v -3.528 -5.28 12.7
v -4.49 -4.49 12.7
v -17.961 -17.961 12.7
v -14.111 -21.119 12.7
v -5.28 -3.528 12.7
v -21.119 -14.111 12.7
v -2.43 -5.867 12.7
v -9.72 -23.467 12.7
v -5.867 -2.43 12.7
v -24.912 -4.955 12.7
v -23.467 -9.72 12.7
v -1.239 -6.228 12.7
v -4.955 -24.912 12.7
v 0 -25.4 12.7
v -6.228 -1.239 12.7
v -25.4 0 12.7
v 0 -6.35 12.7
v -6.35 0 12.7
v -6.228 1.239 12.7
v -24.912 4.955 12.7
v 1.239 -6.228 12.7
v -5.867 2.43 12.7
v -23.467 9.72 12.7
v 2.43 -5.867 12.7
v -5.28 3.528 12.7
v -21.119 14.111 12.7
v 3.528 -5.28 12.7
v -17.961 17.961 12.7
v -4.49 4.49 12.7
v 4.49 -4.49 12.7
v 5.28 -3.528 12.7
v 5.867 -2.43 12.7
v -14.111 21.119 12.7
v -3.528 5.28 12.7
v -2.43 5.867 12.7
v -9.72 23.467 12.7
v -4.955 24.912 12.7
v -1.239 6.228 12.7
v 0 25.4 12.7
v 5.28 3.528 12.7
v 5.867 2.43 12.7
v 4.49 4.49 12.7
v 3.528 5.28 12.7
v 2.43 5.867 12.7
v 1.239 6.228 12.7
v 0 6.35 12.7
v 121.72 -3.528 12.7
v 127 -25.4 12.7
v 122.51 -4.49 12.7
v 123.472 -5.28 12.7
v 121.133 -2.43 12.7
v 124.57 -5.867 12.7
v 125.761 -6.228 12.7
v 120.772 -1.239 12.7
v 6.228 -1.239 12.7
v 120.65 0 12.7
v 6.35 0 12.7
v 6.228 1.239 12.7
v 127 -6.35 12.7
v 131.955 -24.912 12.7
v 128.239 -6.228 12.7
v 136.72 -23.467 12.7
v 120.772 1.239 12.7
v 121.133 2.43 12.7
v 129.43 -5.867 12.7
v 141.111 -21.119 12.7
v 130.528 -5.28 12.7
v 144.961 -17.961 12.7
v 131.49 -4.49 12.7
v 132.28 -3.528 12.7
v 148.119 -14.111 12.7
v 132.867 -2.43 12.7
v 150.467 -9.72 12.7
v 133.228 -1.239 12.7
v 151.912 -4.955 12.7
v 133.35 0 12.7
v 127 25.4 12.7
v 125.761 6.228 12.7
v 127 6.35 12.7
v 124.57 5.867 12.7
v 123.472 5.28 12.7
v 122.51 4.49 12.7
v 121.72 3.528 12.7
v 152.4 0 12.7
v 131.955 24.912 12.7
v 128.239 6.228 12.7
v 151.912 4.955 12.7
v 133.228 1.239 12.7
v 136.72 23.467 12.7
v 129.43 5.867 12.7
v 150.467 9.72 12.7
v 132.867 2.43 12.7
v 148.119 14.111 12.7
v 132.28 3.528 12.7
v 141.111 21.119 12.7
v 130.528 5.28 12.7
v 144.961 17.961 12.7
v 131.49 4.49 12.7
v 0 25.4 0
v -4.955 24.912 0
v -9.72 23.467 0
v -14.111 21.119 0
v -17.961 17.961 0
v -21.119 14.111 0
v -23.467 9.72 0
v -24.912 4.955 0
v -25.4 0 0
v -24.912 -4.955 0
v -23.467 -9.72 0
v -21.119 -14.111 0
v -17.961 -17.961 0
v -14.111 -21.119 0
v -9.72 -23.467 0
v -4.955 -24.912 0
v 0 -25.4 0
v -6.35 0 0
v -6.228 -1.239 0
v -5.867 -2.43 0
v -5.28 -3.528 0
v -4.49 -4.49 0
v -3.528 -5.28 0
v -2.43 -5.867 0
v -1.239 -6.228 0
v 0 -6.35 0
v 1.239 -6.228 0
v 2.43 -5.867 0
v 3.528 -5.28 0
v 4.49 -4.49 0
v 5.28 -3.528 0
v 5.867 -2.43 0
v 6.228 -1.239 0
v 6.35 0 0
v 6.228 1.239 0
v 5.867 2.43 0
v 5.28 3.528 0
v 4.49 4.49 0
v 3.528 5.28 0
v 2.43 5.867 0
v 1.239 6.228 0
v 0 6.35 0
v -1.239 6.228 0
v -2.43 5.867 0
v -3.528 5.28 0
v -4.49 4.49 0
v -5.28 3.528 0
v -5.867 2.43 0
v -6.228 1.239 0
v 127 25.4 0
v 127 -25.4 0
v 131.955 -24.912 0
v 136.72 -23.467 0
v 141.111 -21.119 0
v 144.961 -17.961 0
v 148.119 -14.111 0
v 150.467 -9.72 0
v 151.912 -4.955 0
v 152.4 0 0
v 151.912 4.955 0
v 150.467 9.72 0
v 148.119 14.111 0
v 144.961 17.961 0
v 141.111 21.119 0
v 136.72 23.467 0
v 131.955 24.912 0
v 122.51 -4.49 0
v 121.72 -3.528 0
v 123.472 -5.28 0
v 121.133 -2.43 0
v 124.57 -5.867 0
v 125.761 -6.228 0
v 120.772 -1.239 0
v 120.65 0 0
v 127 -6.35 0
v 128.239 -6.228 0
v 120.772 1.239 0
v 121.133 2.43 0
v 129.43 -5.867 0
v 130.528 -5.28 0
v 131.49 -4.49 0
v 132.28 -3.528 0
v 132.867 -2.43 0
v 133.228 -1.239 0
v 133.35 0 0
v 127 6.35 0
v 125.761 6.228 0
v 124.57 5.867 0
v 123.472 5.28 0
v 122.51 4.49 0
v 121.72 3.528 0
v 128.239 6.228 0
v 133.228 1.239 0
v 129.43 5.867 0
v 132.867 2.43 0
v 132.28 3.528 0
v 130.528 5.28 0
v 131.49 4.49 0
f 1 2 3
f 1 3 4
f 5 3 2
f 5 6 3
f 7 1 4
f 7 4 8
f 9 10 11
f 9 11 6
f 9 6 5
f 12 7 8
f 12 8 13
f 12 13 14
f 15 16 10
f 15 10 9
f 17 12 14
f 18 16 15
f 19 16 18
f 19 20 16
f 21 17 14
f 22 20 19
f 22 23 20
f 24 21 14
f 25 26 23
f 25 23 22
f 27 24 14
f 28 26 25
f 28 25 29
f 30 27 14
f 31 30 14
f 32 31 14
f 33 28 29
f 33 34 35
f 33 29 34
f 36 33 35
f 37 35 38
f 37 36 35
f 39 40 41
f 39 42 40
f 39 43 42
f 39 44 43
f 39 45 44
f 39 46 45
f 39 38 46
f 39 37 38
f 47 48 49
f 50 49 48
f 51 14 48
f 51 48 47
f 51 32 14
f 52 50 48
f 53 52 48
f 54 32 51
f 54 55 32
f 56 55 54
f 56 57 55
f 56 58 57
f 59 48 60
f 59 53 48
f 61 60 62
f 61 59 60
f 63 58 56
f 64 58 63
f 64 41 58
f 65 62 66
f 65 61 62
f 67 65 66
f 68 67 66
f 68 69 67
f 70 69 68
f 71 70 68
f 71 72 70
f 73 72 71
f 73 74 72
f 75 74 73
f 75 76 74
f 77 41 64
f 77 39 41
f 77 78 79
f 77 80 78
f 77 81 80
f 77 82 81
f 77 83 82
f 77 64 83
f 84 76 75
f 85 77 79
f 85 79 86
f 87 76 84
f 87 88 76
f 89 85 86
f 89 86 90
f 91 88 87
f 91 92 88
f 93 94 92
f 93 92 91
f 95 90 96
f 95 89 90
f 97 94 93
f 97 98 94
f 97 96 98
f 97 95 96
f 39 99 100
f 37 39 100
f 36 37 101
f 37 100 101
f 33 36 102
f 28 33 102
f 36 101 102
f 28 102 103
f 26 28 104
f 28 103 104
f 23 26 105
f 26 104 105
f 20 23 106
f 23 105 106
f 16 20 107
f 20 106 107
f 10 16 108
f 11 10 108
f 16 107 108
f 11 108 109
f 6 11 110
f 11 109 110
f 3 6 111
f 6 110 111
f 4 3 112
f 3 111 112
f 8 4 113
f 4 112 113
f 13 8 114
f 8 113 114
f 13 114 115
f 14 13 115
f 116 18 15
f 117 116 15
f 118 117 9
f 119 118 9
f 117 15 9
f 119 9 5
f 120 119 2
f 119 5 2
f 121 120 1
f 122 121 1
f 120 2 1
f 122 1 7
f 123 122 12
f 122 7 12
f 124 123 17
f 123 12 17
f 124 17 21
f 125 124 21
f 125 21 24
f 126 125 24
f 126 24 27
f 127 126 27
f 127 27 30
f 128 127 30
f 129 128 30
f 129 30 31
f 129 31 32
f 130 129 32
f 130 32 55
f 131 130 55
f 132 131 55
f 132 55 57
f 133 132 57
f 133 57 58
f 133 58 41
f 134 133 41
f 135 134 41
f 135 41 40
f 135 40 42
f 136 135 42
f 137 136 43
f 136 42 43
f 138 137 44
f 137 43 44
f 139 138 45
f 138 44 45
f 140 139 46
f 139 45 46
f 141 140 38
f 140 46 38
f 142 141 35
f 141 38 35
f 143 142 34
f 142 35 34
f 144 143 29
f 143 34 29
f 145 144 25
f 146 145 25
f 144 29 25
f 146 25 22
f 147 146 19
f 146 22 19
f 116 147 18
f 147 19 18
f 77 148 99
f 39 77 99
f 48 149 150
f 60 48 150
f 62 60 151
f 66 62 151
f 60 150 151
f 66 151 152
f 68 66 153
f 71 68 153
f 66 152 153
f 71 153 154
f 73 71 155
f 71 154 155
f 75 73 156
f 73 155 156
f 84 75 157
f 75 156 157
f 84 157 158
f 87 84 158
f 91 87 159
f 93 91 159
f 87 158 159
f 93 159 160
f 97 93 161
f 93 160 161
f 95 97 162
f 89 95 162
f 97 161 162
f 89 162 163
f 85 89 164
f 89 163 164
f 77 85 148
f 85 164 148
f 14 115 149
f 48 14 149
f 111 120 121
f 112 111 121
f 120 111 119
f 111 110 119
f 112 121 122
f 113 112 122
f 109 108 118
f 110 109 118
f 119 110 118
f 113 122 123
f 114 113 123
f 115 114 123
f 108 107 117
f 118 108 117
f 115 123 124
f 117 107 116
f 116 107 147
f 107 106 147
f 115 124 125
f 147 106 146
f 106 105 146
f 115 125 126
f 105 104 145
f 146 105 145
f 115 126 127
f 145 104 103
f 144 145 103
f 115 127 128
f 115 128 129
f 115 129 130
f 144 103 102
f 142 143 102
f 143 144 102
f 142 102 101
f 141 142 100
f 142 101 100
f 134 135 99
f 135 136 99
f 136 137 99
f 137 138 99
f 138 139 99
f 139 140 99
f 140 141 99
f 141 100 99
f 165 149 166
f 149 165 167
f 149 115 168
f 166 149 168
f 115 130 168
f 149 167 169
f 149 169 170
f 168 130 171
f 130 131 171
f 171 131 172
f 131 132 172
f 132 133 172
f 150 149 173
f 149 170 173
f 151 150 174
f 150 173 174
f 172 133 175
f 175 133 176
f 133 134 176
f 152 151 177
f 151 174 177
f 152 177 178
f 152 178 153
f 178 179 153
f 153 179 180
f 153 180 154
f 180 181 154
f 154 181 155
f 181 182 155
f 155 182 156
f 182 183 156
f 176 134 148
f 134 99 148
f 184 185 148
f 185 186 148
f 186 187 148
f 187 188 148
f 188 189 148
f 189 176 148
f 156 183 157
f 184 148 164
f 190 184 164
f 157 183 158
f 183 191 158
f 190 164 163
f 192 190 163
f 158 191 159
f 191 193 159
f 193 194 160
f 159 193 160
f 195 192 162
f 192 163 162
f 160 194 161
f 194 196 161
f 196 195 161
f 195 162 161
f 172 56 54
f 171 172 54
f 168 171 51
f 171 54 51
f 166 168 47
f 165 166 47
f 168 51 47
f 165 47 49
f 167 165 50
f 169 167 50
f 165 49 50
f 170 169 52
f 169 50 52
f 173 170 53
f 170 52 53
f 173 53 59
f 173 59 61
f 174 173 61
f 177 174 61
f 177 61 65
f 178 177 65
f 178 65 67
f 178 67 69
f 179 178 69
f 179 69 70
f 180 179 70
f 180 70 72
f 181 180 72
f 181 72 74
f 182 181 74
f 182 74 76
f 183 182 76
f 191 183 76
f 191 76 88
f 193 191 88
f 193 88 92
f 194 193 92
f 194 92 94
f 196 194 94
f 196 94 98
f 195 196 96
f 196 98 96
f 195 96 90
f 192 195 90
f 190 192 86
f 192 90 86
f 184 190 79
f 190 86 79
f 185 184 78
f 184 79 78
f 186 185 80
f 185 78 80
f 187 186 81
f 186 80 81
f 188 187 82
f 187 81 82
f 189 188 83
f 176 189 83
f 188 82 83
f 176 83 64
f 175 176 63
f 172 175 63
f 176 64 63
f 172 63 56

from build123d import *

# Parameters (mm, degrees)
F2_DEPTH = 12.7
F3_D     = 12.7
F3_DEPTH = 25.4
F4_D     = 12.7
F4_DEPTH = 127


with BuildPart() as f2:
    # F0 (on Top) → F2 (new body)
    with BuildSketch(Plane.XY):
        with BuildLine():
            ThreePointArc((25.4, 0), (17.960512, -17.960512), (0, -25.4))
            Line((0, -25.4), (127, -25.4))
            ThreePointArc((127, -25.4), (101.6, 0), (127, 25.4))
            Line((127, 25.4), (0, 25.4))
            ThreePointArc((0, 25.4), (17.960512, 17.960512), (25.4, 0))
        make_face()
        with BuildLine():
            ThreePointArc((0, 25.4), (-25.4, 0), (0, -25.4))
            ThreePointArc((0, -25.4), (17.960512, -17.960512), (25.4, 0))
            ThreePointArc((25.4, 0), (17.960512, 17.960512), (0, 25.4))
        make_face()
        with BuildLine():
            ThreePointArc((127, 25.4), (101.6, 0), (127, -25.4))
            ThreePointArc((127, -25.4), (144.960512, -17.960512), (152.4, 0))
            ThreePointArc((152.4, 0), (144.960512, 17.960512), (127, 25.4))
        make_face()
    extrude(amount=F2_DEPTH)

    # F3
    with Locations(Plane(origin=(0, 0, 0), x_dir=(1, 0, 0), z_dir=(0, 0, -1))):
        with Locations((0, 0)):
            Hole(F3_D / 2, depth=F3_DEPTH)

    # F4
    with Locations(Plane(origin=(0, 0, 0), x_dir=(1, 0, 0), z_dir=(0, 0, -1))):
        with Locations((127, 0)):
            Hole(F4_D / 2, depth=F4_DEPTH)


solid = f2.part
